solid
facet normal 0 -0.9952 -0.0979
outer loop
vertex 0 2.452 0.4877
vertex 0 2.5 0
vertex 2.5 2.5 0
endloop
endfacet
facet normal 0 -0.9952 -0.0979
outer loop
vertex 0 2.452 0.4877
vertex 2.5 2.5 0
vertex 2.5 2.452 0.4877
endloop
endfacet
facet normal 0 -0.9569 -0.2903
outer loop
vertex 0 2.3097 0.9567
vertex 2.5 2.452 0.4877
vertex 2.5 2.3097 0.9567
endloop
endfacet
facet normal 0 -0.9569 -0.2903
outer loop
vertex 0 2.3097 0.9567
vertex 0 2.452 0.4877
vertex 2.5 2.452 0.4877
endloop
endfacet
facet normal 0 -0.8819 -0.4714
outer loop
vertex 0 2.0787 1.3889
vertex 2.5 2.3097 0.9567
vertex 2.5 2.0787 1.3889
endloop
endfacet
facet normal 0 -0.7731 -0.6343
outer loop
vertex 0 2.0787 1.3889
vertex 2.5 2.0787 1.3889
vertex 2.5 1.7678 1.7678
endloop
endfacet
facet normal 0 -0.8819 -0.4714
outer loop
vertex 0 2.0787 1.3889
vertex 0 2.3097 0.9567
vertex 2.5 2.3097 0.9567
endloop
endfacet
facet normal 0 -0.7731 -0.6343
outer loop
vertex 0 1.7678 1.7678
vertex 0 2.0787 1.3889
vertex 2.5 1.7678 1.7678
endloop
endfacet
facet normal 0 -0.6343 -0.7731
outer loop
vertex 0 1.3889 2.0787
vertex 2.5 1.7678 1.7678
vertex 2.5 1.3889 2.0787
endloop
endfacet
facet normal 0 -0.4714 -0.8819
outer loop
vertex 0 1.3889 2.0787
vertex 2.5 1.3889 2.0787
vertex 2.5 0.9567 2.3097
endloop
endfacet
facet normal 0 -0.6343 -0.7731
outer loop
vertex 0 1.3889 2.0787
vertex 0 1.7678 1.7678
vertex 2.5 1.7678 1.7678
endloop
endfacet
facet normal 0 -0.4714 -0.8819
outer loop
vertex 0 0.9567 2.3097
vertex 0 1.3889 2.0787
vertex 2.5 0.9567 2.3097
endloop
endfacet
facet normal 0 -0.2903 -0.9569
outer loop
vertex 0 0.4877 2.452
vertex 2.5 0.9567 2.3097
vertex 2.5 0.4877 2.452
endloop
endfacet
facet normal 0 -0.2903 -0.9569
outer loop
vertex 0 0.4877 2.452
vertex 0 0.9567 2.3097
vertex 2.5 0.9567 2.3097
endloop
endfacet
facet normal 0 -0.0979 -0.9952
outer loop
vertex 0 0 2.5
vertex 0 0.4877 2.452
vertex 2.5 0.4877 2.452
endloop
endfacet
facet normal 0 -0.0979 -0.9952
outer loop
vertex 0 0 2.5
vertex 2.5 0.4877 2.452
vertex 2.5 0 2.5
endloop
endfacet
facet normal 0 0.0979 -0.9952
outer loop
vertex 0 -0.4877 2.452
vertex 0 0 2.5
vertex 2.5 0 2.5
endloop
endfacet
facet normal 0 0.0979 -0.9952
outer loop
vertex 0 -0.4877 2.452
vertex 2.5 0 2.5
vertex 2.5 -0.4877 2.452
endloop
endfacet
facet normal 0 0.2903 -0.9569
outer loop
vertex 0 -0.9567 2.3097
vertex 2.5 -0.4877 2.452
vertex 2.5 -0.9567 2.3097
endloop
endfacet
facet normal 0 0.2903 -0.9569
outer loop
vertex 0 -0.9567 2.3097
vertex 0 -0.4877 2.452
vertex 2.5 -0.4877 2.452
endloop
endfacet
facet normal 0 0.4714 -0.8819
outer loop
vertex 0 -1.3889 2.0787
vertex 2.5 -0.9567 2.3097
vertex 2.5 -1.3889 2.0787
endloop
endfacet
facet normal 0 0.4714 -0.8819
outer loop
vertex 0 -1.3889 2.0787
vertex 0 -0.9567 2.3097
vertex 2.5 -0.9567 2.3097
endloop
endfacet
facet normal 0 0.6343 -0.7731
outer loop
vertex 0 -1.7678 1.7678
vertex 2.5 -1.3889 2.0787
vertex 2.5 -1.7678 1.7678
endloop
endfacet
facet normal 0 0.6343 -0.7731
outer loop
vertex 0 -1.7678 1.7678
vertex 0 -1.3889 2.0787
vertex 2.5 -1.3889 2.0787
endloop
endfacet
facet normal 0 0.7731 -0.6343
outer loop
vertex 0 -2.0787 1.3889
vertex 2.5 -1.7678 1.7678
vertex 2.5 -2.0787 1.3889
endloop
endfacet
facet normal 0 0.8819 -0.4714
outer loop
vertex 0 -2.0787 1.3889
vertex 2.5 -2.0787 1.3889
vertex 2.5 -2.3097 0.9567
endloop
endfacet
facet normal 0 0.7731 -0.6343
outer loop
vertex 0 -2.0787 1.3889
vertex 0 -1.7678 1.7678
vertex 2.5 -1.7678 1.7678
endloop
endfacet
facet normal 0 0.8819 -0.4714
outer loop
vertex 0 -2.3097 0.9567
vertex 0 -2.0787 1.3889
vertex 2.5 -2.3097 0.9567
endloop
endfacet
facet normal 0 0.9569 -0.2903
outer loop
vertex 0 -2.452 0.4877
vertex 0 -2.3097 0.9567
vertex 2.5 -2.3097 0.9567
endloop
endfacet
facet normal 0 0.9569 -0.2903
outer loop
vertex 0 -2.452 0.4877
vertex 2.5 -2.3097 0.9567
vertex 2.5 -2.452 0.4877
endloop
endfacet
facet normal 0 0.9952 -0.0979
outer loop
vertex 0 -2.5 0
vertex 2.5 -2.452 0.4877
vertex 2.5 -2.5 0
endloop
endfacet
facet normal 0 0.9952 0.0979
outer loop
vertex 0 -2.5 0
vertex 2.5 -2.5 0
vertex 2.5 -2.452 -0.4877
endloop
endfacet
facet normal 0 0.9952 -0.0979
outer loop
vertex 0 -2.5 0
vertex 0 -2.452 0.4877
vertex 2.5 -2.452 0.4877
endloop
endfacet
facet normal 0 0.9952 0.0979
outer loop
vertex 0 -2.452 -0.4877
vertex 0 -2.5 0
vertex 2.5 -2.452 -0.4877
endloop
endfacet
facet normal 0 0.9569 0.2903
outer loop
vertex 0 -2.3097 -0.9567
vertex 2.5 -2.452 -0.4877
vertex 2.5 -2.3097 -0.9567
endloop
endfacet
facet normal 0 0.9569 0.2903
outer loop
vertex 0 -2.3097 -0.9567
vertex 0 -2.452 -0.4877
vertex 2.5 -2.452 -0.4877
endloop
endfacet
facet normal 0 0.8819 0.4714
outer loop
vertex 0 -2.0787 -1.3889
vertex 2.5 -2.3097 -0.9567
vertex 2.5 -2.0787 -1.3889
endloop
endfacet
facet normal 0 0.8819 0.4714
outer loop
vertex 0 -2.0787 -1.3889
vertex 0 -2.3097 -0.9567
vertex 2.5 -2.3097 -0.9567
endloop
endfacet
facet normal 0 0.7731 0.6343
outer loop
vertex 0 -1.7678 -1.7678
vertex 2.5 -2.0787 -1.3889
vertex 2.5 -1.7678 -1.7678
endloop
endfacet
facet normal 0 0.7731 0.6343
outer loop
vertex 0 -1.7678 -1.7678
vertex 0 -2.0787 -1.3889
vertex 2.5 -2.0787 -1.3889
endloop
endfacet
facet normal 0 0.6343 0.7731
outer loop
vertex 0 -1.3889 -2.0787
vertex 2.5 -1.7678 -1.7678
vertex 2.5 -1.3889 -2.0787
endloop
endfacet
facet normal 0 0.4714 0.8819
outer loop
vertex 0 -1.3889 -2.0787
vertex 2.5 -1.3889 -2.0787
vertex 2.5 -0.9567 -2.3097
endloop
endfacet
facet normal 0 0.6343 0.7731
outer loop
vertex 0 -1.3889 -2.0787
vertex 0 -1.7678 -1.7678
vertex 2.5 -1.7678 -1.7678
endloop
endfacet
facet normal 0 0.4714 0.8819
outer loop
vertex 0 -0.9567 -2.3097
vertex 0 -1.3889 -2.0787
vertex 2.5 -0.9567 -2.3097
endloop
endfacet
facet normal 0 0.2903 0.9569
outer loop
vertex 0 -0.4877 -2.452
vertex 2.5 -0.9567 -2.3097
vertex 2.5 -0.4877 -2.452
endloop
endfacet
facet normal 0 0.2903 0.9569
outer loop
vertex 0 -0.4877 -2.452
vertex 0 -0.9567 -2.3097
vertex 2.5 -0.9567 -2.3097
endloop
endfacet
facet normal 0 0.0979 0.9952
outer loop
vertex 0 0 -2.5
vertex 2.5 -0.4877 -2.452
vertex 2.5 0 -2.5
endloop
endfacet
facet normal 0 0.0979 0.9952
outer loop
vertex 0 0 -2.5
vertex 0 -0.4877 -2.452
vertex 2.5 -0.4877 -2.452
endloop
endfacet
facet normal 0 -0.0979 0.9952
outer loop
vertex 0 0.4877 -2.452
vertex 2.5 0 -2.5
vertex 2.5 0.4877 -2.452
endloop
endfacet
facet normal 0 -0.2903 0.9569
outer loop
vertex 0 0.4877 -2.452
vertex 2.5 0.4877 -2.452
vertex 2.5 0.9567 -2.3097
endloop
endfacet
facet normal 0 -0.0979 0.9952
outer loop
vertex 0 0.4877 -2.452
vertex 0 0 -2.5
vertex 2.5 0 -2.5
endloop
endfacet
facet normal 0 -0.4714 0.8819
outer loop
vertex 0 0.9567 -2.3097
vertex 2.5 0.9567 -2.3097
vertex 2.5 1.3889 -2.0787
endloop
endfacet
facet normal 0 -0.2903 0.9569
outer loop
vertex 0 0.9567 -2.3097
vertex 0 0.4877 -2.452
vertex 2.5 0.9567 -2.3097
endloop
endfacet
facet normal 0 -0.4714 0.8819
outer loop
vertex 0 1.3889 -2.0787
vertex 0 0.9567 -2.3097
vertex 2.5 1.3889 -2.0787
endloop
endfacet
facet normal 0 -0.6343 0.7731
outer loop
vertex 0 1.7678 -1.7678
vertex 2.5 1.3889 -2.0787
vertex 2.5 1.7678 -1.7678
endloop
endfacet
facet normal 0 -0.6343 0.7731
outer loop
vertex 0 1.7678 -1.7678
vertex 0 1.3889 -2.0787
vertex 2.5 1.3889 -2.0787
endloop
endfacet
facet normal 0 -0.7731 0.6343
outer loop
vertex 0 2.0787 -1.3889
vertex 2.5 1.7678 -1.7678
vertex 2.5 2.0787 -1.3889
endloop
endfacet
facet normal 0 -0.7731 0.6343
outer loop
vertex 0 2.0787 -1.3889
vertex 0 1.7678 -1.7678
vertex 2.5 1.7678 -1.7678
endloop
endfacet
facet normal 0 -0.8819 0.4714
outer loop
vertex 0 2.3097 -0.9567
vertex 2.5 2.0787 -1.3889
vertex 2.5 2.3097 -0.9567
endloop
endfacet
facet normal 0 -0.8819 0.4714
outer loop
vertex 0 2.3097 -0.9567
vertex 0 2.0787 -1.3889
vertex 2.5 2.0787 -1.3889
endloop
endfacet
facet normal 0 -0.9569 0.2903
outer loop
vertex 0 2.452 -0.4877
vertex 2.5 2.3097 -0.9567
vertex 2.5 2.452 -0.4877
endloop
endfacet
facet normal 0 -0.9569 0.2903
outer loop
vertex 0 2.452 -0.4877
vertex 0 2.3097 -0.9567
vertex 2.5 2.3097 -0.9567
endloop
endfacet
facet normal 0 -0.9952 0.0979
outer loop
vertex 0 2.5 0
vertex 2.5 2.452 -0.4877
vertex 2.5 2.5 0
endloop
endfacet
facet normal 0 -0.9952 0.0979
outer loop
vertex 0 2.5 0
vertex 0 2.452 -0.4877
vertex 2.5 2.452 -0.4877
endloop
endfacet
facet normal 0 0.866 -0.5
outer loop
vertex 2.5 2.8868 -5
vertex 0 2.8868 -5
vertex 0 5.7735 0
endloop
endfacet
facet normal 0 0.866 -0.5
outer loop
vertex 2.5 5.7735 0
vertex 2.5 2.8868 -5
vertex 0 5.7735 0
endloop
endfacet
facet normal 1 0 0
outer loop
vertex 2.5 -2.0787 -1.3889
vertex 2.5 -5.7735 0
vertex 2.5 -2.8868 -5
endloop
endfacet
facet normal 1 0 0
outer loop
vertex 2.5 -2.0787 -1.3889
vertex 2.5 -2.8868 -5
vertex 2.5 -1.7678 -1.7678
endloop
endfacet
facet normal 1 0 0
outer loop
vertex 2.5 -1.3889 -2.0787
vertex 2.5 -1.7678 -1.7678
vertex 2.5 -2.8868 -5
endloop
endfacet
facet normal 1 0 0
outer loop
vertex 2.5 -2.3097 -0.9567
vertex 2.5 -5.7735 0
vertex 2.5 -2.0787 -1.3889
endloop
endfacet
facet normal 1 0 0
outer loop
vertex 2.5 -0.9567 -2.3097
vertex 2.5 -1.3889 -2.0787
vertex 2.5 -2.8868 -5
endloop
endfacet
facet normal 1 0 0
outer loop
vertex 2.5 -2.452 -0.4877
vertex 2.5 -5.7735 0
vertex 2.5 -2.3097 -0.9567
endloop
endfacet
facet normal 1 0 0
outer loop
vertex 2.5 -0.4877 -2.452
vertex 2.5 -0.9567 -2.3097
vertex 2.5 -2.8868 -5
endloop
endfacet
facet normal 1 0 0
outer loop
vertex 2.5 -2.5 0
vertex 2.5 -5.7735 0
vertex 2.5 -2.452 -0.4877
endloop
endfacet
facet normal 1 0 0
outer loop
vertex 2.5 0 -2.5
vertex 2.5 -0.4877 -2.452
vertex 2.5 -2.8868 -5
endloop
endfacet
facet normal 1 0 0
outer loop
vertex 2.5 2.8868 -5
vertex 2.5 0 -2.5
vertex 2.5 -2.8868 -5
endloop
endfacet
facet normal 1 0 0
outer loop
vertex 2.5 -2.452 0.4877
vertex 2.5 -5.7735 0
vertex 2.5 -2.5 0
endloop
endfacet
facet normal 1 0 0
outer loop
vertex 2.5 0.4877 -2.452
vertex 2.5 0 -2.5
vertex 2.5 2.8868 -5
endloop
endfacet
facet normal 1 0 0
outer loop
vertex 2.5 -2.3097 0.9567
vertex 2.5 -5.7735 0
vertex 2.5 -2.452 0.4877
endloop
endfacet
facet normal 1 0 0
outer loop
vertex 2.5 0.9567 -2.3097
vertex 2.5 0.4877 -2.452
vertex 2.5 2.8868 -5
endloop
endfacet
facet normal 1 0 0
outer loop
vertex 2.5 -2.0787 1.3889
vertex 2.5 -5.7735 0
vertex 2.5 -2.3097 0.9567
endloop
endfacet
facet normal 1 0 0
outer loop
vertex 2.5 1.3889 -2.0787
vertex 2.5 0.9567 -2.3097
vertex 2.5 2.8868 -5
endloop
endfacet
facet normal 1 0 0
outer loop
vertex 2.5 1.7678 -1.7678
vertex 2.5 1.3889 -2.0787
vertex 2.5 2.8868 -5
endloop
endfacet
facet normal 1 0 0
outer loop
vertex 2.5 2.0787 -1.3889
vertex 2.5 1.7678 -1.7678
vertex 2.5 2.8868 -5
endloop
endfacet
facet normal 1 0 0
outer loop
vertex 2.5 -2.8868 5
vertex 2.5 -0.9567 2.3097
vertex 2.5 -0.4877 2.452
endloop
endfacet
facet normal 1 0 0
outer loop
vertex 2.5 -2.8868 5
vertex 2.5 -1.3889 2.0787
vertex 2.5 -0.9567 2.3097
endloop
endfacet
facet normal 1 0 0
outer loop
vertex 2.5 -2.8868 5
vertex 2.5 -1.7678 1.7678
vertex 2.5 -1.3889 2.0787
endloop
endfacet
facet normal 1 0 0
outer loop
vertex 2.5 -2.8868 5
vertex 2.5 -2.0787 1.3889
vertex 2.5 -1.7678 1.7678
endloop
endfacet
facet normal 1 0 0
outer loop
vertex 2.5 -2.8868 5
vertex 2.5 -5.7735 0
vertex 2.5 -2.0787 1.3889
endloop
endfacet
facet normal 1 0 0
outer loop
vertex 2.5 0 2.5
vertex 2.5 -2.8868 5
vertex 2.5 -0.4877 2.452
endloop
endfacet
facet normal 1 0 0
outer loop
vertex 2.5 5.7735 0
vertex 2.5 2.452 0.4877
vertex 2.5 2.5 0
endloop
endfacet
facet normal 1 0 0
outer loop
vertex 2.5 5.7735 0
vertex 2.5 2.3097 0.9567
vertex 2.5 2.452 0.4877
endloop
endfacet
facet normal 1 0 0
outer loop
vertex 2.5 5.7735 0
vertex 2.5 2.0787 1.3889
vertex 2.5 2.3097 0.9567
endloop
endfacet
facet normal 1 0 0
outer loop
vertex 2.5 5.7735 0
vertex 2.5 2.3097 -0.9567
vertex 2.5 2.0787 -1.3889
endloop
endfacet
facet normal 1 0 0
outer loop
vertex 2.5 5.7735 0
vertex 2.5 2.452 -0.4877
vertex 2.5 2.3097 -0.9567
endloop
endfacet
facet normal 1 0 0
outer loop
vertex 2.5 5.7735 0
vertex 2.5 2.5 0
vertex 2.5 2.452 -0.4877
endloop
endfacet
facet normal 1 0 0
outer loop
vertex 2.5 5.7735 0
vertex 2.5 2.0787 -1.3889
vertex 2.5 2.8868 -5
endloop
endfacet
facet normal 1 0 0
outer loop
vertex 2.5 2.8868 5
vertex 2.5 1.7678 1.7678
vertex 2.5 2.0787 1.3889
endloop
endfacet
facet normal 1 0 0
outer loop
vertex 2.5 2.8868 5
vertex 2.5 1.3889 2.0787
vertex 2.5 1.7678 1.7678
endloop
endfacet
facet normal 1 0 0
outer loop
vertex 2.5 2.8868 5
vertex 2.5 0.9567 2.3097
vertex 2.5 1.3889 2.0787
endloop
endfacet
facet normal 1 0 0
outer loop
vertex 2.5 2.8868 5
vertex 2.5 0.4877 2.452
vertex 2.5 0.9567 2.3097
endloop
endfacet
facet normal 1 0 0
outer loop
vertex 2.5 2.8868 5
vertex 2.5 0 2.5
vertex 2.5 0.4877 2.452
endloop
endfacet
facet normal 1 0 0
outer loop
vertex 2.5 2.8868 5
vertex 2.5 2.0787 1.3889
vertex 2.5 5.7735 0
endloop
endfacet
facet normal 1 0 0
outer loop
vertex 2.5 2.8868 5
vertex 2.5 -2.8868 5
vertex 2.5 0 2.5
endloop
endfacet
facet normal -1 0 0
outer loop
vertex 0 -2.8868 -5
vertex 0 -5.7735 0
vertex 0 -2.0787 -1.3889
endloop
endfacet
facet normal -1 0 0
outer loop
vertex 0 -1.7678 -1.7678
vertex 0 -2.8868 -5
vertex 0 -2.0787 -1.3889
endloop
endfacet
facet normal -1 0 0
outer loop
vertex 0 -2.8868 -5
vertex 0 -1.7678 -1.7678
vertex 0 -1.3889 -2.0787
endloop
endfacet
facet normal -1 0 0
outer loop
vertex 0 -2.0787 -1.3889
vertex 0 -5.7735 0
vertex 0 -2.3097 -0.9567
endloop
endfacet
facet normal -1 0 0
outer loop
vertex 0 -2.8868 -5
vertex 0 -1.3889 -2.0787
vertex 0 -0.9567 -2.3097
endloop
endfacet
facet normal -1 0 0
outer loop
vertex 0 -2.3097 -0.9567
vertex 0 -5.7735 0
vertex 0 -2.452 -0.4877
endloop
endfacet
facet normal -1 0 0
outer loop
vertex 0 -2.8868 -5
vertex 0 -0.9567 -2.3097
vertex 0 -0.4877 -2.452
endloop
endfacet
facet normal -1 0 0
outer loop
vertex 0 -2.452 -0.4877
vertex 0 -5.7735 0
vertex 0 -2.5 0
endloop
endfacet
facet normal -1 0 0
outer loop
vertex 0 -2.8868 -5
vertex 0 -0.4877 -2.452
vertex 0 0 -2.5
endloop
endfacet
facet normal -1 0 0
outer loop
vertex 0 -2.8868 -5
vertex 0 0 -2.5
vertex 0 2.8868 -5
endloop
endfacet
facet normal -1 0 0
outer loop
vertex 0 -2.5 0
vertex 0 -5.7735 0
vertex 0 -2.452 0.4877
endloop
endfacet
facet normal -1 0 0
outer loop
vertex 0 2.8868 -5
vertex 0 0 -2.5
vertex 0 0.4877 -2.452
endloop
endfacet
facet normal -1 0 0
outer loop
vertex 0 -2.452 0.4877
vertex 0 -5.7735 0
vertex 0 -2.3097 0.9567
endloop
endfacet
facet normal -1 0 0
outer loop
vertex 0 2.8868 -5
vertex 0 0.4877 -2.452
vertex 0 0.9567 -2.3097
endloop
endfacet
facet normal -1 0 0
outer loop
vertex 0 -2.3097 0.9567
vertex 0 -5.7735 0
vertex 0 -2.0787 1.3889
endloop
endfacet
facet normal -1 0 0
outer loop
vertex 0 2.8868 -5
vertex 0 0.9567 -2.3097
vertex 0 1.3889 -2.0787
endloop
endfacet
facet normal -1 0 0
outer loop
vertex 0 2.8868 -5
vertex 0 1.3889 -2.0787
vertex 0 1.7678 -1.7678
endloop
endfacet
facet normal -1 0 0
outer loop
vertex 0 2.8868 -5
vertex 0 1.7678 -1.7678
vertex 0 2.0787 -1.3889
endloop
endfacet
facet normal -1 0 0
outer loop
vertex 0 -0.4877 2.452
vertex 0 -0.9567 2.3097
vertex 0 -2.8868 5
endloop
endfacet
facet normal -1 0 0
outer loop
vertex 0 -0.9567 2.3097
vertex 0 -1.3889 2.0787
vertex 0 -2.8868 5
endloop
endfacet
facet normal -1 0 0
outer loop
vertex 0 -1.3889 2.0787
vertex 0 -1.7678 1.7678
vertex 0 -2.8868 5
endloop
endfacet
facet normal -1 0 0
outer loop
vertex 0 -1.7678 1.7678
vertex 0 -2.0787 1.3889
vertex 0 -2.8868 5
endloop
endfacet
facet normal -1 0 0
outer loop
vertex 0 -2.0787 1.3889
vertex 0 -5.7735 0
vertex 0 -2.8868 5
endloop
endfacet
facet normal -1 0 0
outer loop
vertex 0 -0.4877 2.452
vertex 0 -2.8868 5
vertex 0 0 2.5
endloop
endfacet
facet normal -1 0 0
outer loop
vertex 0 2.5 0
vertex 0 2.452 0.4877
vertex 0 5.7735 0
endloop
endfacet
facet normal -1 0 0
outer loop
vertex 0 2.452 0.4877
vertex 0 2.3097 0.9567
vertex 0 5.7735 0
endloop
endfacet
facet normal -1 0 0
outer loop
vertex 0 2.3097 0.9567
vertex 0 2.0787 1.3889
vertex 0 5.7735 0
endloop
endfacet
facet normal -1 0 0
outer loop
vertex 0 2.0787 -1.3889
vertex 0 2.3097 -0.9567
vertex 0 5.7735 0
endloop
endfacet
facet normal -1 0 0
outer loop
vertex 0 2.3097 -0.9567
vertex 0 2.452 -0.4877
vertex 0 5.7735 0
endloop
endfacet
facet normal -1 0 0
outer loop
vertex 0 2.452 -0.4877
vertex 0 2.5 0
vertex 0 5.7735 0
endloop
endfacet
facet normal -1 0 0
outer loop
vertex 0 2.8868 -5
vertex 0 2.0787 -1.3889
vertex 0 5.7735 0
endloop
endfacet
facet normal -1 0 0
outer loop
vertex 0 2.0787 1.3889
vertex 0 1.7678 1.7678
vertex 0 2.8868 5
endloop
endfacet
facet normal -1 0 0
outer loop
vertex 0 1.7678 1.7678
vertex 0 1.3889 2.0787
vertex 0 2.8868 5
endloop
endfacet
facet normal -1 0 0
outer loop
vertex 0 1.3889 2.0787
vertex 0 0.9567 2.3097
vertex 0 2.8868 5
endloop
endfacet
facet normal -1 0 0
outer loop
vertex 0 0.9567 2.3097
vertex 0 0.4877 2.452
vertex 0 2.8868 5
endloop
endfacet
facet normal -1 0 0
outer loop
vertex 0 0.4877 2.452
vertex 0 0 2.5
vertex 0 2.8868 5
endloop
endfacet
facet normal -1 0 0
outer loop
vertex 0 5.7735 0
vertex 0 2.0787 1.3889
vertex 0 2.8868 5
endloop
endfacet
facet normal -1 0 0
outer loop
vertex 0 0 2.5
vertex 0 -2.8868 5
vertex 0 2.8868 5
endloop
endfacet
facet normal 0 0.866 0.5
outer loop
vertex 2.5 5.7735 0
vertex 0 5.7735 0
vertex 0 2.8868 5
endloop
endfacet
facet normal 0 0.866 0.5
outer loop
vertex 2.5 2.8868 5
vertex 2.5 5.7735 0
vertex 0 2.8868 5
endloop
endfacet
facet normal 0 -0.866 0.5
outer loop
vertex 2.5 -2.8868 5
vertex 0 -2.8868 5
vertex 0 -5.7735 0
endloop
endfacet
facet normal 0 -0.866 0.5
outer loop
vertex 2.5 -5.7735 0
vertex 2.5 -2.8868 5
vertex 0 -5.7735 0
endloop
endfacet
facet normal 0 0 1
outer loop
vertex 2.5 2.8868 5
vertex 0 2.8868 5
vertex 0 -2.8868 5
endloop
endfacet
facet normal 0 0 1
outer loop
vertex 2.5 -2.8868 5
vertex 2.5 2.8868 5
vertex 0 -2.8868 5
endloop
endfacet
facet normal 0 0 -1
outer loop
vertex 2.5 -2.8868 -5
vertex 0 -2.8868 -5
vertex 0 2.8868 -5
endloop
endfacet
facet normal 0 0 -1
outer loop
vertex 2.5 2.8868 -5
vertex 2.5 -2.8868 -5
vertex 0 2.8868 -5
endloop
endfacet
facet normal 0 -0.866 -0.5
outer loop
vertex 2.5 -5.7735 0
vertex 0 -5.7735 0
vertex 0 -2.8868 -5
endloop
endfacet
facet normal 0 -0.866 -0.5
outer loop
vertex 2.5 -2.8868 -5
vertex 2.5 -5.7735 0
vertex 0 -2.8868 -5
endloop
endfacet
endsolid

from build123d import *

# Parameters (mm, degrees)
F0_R     = 2.5
F1_DEPTH = 2.5


with BuildPart() as f1:
    # F0 (on Right) → F1 (new body)
    with BuildSketch(Plane.YZ):
        Polygon((2.886751, 5), (-2.886751, 5), (-5.773503, 0), (-2.886751, -5), (2.886751, -5), (5.773503, 0), align=None)
        Circle(F0_R, mode=Mode.SUBTRACT)
    extrude(amount=F1_DEPTH)


solid = f1.part
